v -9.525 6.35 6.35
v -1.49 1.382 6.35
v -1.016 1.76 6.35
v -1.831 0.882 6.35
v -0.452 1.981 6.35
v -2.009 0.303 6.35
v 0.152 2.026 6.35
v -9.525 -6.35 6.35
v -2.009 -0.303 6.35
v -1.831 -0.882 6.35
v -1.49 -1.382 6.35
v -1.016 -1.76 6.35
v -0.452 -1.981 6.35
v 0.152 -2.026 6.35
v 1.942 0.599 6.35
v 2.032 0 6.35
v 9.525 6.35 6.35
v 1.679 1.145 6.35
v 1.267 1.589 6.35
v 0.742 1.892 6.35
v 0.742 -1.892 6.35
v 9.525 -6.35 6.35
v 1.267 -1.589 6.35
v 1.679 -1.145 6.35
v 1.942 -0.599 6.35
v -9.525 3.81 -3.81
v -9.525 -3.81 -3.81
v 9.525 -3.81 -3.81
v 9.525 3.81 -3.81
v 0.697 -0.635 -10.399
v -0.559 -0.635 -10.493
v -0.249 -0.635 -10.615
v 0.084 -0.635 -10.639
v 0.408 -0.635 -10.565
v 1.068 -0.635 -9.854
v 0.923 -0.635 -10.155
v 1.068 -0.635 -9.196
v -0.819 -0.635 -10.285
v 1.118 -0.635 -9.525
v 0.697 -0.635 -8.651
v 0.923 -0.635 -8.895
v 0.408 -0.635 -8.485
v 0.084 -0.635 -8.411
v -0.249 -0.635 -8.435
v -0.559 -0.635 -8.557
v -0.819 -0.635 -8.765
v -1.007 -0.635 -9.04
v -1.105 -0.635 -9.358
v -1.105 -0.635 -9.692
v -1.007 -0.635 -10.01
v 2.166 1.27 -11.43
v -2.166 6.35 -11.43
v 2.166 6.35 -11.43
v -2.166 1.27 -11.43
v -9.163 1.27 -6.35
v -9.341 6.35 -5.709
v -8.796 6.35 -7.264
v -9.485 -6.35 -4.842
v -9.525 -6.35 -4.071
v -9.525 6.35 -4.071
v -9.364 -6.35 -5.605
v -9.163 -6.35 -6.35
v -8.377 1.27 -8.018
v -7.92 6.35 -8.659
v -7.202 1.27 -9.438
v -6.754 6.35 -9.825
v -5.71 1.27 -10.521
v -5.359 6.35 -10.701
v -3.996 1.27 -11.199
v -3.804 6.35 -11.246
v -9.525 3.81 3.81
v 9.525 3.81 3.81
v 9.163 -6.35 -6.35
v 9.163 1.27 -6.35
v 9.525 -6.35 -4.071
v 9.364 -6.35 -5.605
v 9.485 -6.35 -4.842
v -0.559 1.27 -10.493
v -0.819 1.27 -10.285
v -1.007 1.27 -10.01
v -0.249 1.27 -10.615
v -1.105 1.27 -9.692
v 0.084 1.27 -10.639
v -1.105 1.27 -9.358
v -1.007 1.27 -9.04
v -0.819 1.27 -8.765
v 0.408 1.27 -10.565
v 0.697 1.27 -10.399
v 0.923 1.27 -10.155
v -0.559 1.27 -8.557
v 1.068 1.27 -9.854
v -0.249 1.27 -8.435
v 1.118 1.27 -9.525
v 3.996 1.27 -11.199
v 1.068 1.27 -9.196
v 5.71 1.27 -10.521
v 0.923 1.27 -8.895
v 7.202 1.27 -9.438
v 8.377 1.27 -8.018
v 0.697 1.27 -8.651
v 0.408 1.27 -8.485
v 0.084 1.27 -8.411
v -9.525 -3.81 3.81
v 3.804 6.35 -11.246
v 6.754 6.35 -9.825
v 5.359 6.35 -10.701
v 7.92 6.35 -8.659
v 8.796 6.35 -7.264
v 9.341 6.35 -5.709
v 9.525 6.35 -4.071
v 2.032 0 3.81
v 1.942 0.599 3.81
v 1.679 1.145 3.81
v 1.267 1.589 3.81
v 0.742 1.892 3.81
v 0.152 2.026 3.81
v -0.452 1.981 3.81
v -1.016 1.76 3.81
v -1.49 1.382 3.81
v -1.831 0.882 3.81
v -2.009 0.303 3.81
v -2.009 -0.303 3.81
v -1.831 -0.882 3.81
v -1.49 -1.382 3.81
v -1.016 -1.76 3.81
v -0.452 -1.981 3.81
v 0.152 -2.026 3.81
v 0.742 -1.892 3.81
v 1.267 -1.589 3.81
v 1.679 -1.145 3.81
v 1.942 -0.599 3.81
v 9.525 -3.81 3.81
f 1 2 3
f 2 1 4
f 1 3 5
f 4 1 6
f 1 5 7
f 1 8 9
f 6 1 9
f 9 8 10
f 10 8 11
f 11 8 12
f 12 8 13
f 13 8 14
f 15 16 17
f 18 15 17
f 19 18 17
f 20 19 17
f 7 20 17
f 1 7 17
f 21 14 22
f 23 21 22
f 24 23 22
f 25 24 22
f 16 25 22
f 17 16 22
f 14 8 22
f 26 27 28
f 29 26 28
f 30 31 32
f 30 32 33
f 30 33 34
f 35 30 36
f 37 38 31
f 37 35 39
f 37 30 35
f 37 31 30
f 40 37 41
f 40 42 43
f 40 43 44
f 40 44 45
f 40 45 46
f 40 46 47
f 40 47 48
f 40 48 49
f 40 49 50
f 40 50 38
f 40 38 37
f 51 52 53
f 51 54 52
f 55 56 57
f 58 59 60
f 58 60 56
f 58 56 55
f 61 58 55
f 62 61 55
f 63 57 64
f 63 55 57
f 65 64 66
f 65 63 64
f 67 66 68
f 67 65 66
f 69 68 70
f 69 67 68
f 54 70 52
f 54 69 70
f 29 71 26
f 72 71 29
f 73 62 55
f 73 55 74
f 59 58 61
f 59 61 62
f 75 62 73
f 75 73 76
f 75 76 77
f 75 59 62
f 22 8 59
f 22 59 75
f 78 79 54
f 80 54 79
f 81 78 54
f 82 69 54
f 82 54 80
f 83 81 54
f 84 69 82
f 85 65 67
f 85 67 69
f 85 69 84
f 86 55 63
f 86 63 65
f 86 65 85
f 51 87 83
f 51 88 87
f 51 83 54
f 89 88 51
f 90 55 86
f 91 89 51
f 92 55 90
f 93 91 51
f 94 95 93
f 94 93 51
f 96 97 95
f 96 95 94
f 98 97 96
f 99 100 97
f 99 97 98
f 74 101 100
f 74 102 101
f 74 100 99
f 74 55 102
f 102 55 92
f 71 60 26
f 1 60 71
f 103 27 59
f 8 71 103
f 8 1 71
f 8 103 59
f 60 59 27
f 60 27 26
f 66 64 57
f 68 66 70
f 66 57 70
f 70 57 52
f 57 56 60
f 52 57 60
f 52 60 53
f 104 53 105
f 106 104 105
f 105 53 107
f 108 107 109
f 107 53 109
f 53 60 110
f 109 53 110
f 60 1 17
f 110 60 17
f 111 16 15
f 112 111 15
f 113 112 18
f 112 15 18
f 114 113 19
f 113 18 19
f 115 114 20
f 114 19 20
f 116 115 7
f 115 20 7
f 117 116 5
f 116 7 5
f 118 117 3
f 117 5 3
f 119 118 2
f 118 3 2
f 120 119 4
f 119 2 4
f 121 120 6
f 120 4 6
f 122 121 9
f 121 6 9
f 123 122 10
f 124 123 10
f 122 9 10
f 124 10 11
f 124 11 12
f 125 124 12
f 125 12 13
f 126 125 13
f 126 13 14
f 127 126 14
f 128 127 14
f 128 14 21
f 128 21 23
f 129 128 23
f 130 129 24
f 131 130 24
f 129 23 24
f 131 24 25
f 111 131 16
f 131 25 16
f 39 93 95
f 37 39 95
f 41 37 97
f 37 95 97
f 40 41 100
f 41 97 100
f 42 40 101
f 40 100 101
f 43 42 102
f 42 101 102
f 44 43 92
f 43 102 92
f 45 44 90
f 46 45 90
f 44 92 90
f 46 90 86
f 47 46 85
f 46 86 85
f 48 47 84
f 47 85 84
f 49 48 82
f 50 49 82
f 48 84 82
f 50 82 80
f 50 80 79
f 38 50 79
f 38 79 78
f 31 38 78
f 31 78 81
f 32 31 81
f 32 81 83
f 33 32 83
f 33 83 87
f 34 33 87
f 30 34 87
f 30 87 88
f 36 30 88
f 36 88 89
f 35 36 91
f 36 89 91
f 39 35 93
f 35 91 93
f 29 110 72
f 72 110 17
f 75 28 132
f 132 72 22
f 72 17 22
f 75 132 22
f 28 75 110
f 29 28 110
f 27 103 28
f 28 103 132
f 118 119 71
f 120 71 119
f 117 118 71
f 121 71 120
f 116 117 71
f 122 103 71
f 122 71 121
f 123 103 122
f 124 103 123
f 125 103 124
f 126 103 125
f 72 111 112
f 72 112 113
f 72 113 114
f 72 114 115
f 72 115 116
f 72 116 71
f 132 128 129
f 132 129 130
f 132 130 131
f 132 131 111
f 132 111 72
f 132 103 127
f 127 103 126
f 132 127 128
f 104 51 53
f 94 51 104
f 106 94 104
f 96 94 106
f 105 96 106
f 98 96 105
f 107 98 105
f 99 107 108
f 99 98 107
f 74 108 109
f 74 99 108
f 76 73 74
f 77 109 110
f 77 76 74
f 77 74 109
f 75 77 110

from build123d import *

# Parameters (mm, degrees)
F0_W     = 19.05
F0_H     = 12.7
F1_DEPTH = 6.35
F2_T     = -2.54
F3_R     = 2.032
F4_DEPTH = 2.54
F5_W     = 19.05
F5_H     = 5.08
F6_DEPTH = 5.08
F7_R     = 1.1176
F8_DEPTH = 1.905
F9_R     = 7.358523


with BuildPart() as f1:
    # F0 (on Front) → F1 (new body, symmetric)
    with BuildSketch(Plane.XZ):
        Rectangle(F0_W, F0_H)
    extrude(amount=F1_DEPTH, both=True)

    # F2
    f2_openings = [f1.faces().sort_by_distance(p)[0] for p in [
        (9.525, 0, 0),
        (-9.525, 0, 0),
    ]]
    offset(amount=F2_T, openings=f2_openings)

    # F3 (on face) → F4 (cut)
    with BuildSketch(Plane.XY.offset(6.35)):
        Circle(F3_R)
    extrude(amount=-F4_DEPTH, mode=Mode.SUBTRACT)

    # F5 (on face) → F6 (join)
    with BuildSketch(Plane(origin=(0, 0, -6.35), x_dir=(1, 0, 0), z_dir=(0, 0, -1))):
        with Locations((0, -3.81)):
            Rectangle(F5_W, F5_H)
    extrude(amount=F6_DEPTH)

    # F7 (on face) → F8 (join)
    with BuildSketch(Plane.XZ.offset(-1.27)):
        with Locations((0, -9.525)):
            Circle(F7_R)
    extrude(amount=F8_DEPTH)

    # F9
    f9_edges = [f1.edges().sort_by_distance(p)[0] for p in [
        (9.525, 3.81, -11.43),
        (-9.525, 3.81, -11.43),
    ]]
    fillet(f9_edges, radius=F9_R)


solid = f1.part
